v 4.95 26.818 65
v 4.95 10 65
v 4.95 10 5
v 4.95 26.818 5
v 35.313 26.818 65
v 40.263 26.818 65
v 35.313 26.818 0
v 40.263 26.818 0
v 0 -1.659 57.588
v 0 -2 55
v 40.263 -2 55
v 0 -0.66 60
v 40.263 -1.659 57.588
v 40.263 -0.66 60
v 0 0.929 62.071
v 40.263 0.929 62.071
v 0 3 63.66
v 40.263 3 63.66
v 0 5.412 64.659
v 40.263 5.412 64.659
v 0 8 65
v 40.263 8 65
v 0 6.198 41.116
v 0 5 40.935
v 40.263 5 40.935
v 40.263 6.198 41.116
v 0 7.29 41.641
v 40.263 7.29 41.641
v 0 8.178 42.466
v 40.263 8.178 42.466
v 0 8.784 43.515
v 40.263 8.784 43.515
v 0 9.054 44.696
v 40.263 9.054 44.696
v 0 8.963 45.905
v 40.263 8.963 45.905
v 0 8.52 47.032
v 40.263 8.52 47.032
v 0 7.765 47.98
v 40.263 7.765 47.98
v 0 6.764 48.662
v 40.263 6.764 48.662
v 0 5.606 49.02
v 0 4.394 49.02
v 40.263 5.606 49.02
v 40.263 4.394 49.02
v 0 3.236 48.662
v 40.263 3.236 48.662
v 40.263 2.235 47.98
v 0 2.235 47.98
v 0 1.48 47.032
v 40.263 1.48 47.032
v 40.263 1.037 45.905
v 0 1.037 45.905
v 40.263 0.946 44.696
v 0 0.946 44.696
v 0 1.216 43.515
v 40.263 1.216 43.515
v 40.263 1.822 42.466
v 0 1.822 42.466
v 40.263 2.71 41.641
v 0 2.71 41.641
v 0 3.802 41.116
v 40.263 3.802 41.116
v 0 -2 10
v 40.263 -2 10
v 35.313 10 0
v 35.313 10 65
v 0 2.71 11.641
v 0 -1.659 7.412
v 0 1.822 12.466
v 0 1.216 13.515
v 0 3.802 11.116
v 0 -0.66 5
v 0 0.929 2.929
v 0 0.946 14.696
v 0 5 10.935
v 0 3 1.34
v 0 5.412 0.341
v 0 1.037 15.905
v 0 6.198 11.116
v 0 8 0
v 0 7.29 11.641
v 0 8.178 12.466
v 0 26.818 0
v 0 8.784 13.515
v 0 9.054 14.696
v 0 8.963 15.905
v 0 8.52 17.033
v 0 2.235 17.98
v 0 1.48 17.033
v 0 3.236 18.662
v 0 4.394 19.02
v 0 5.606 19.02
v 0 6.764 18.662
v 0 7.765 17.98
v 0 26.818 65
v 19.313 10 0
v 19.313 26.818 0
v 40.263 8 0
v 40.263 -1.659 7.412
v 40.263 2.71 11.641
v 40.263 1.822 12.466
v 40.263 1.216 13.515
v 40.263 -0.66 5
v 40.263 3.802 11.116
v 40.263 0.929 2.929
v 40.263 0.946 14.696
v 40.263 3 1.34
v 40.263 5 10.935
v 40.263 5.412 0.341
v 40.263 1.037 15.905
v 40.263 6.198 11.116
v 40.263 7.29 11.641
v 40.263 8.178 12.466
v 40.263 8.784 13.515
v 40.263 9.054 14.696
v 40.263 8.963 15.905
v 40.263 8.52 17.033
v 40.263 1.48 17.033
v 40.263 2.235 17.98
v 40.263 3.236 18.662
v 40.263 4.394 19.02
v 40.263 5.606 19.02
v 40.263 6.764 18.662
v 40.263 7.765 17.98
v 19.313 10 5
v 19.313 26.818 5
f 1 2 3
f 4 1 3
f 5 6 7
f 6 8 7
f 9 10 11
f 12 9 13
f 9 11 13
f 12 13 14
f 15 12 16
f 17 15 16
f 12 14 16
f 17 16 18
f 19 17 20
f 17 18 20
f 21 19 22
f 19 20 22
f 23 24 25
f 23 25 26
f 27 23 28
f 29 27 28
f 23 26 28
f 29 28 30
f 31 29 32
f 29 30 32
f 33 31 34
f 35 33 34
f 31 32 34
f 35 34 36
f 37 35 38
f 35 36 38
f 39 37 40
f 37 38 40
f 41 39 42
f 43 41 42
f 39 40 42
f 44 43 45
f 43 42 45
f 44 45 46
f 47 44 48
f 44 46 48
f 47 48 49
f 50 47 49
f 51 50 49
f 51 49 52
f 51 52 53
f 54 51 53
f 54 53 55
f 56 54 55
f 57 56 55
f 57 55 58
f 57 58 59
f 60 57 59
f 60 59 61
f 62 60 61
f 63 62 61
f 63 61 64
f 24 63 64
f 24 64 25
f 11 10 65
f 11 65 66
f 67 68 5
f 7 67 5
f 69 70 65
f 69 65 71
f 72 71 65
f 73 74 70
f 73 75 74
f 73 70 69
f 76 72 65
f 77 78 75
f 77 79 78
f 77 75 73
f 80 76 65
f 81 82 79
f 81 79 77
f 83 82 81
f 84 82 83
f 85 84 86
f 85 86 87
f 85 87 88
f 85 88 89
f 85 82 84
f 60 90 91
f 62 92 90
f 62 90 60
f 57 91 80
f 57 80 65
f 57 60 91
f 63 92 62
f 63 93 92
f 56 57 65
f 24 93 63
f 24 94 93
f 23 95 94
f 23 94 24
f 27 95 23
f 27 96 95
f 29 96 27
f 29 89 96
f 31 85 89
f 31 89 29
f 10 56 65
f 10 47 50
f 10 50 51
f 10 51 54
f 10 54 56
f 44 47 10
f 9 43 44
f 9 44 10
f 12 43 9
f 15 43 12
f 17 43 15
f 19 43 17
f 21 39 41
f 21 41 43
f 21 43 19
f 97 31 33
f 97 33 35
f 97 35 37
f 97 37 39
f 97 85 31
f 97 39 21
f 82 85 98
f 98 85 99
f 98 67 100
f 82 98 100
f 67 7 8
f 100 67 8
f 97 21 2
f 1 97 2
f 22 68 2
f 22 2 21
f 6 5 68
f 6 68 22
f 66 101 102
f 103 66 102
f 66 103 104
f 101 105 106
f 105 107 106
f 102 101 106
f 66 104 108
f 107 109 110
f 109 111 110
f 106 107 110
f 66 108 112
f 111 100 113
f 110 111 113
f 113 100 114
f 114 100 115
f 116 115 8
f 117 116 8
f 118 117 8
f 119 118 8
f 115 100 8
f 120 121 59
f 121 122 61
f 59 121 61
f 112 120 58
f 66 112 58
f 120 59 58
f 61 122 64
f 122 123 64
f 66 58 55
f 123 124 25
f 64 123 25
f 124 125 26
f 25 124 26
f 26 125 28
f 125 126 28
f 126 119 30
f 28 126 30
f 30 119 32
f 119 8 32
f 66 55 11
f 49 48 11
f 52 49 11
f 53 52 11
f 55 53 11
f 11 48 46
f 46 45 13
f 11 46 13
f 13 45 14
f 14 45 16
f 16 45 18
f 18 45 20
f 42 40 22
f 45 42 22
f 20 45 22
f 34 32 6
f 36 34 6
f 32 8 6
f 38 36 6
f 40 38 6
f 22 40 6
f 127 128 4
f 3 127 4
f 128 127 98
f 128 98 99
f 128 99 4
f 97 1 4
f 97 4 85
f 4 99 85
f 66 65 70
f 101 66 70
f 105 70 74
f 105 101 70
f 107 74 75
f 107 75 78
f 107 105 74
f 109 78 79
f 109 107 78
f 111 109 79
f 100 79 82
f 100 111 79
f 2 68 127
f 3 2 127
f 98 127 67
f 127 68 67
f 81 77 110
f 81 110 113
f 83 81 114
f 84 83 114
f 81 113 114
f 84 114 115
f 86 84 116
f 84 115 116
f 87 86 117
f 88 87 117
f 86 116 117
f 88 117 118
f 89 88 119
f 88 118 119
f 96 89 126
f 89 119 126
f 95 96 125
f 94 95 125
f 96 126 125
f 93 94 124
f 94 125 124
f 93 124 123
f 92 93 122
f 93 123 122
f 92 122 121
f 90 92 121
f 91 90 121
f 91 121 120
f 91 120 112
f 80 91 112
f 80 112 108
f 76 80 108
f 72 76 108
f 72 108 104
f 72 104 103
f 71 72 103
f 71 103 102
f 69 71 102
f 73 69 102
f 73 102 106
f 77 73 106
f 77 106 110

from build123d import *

# Parameters (mm, degrees)
ESQUISSE1_W               = 40.2629848
ESQUISSE1_H               = 26.817935246
BOSS_EXTRU_1_DEPTH        = 65
COQUE1_T                  = -1.5
COQUE1_THICKNESS_2_FACE_W = 63.5
COQUE1_THICKNESS_2_FACE_H = 25.317935246
COQUE1_THICKNESS_2_DEPTH  = 3.45
COQUE1_THICKNESS_3_FACE_W = 25.317935246
COQUE1_THICKNESS_3_FACE_H = 63.5
COQUE1_THICKNESS_3_DEPTH  = 3.45
COQUE1_THICKNESS_4_FACE_W = 63.5
COQUE1_THICKNESS_4_FACE_H = 30.3629848
COQUE1_THICKNESS_4_DEPTH  = 8.5
COQUE1_THICKNESS_5_FACE_W = 30.3629848
COQUE1_THICKNESS_5_FACE_H = 16.817935246
COQUE1_THICKNESS_5_DEPTH  = 3.5
ESQUISSE4_W               = 40.2629848
ESQUISSE4_H               = 65
BOSS_EXTRU_2_DEPTH        = 2
ESQUISSE5_R               = 4.065
ENL_V_MAT_EXTRU_3_DEPTH   = 82.026598076
CONG_2_R                  = 10
CONG_3_R                  = 10
ESQUISSE6_W               = 16
ESQUISSE6_H               = 16.817935246
ENL_V_MAT_EXTRU_4_DEPTH   = 78.073403946


with BuildPart() as part:
    # Esquisse1 → Boss.-Extru.1 (new body)
    with BuildSketch(Plane.XY):
        with Locations((20.1314924, 13.408967623)):
            Rectangle(ESQUISSE1_W, ESQUISSE1_H)
    extrude(amount=BOSS_EXTRU_1_DEPTH)

    # Coque1
    coque1_openings = [part.faces().sort_by_distance(p)[0] for p in [
        (20.1314924, 13.408967623, 65),
        (20.1314924, 26.817935246, 32.5),
    ]]
    offset(amount=COQUE1_T, openings=coque1_openings, kind=Kind.INTERSECTION)

    # Coque1 thickness 2 face (on inner face of the shell) → Coque1 thickness 2 (add)
    with BuildSketch(Plane(origin=(1.5, 14.158967623, 33.25), x_dir=(0, 0, -1), z_dir=(-1, 0, 0))):
        Rectangle(COQUE1_THICKNESS_2_FACE_W, COQUE1_THICKNESS_2_FACE_H)
    extrude(amount=-COQUE1_THICKNESS_2_DEPTH)

    # Coque1 thickness 3 face (on inner face of the shell) → Coque1 thickness 3 (add)
    with BuildSketch(Plane(origin=(38.7629848, 14.158967623, 33.25), x_dir=(0, 1, 0), z_dir=(1, 0, 0))):
        Rectangle(COQUE1_THICKNESS_3_FACE_W, COQUE1_THICKNESS_3_FACE_H)
    extrude(amount=-COQUE1_THICKNESS_3_DEPTH)

    # Coque1 thickness 4 face (on inner face of the shell) → Coque1 thickness 4 (add)
    with BuildSketch(Plane(origin=(20.1314924, 1.5, 33.25), x_dir=(0, 0, -1), z_dir=(0, -1, 0))):
        Rectangle(COQUE1_THICKNESS_4_FACE_W, COQUE1_THICKNESS_4_FACE_H)
    extrude(amount=-COQUE1_THICKNESS_4_DEPTH)

    # Coque1 thickness 5 face (on inner face of the shell) → Coque1 thickness 5 (add)
    with BuildSketch(Plane(origin=(20.1314924, 18.408967623, 1.5), x_dir=(-1, 0, 0), z_dir=(0, 0, -1))):
        Rectangle(COQUE1_THICKNESS_5_FACE_W, COQUE1_THICKNESS_5_FACE_H)
    extrude(amount=-COQUE1_THICKNESS_5_DEPTH)

    # Esquisse4 → Boss.-Extru.2 (add)
    with BuildSketch(Plane.XZ):
        with Locations((20.1314924, 32.5)):
            Rectangle(ESQUISSE4_W, ESQUISSE4_H)
    extrude(amount=BOSS_EXTRU_2_DEPTH)

    # Esquisse5 → Enlèv. mat.-Extru.3 (cut, through all)
    with BuildSketch(Plane(origin=(40.2629848, 0, 0), x_dir=(0, 0, -1), z_dir=(1, 0, 0))):
        with Locations((-15, 5)):
            Circle(ESQUISSE5_R)
        with Locations((-45, 5)):
            Circle(ESQUISSE5_R)
    extrude(amount=-ENL_V_MAT_EXTRU_3_DEPTH, mode=Mode.SUBTRACT)

    # Congé2
    cong_2_edges = [part.edges().sort_by_distance(p)[0] for p in [
        (20.1314924, -2, 0),
    ]]
    fillet(cong_2_edges, radius=CONG_2_R)

    # Congé3
    cong_3_edges = [part.edges().sort_by_distance(p)[0] for p in [
        (20.1314924, -2, 65),
    ]]
    fillet(cong_3_edges, radius=CONG_3_R)

    # Esquisse6 → Enlèv. mat.-Extru.4 (cut, through all)
    with BuildSketch(Plane.XY.offset(5)):
        with Locations((27.3129848, 18.408967623)):
            Rectangle(ESQUISSE6_W, ESQUISSE6_H)
    extrude(amount=-ENL_V_MAT_EXTRU_4_DEPTH, mode=Mode.SUBTRACT)


solid = part.part
